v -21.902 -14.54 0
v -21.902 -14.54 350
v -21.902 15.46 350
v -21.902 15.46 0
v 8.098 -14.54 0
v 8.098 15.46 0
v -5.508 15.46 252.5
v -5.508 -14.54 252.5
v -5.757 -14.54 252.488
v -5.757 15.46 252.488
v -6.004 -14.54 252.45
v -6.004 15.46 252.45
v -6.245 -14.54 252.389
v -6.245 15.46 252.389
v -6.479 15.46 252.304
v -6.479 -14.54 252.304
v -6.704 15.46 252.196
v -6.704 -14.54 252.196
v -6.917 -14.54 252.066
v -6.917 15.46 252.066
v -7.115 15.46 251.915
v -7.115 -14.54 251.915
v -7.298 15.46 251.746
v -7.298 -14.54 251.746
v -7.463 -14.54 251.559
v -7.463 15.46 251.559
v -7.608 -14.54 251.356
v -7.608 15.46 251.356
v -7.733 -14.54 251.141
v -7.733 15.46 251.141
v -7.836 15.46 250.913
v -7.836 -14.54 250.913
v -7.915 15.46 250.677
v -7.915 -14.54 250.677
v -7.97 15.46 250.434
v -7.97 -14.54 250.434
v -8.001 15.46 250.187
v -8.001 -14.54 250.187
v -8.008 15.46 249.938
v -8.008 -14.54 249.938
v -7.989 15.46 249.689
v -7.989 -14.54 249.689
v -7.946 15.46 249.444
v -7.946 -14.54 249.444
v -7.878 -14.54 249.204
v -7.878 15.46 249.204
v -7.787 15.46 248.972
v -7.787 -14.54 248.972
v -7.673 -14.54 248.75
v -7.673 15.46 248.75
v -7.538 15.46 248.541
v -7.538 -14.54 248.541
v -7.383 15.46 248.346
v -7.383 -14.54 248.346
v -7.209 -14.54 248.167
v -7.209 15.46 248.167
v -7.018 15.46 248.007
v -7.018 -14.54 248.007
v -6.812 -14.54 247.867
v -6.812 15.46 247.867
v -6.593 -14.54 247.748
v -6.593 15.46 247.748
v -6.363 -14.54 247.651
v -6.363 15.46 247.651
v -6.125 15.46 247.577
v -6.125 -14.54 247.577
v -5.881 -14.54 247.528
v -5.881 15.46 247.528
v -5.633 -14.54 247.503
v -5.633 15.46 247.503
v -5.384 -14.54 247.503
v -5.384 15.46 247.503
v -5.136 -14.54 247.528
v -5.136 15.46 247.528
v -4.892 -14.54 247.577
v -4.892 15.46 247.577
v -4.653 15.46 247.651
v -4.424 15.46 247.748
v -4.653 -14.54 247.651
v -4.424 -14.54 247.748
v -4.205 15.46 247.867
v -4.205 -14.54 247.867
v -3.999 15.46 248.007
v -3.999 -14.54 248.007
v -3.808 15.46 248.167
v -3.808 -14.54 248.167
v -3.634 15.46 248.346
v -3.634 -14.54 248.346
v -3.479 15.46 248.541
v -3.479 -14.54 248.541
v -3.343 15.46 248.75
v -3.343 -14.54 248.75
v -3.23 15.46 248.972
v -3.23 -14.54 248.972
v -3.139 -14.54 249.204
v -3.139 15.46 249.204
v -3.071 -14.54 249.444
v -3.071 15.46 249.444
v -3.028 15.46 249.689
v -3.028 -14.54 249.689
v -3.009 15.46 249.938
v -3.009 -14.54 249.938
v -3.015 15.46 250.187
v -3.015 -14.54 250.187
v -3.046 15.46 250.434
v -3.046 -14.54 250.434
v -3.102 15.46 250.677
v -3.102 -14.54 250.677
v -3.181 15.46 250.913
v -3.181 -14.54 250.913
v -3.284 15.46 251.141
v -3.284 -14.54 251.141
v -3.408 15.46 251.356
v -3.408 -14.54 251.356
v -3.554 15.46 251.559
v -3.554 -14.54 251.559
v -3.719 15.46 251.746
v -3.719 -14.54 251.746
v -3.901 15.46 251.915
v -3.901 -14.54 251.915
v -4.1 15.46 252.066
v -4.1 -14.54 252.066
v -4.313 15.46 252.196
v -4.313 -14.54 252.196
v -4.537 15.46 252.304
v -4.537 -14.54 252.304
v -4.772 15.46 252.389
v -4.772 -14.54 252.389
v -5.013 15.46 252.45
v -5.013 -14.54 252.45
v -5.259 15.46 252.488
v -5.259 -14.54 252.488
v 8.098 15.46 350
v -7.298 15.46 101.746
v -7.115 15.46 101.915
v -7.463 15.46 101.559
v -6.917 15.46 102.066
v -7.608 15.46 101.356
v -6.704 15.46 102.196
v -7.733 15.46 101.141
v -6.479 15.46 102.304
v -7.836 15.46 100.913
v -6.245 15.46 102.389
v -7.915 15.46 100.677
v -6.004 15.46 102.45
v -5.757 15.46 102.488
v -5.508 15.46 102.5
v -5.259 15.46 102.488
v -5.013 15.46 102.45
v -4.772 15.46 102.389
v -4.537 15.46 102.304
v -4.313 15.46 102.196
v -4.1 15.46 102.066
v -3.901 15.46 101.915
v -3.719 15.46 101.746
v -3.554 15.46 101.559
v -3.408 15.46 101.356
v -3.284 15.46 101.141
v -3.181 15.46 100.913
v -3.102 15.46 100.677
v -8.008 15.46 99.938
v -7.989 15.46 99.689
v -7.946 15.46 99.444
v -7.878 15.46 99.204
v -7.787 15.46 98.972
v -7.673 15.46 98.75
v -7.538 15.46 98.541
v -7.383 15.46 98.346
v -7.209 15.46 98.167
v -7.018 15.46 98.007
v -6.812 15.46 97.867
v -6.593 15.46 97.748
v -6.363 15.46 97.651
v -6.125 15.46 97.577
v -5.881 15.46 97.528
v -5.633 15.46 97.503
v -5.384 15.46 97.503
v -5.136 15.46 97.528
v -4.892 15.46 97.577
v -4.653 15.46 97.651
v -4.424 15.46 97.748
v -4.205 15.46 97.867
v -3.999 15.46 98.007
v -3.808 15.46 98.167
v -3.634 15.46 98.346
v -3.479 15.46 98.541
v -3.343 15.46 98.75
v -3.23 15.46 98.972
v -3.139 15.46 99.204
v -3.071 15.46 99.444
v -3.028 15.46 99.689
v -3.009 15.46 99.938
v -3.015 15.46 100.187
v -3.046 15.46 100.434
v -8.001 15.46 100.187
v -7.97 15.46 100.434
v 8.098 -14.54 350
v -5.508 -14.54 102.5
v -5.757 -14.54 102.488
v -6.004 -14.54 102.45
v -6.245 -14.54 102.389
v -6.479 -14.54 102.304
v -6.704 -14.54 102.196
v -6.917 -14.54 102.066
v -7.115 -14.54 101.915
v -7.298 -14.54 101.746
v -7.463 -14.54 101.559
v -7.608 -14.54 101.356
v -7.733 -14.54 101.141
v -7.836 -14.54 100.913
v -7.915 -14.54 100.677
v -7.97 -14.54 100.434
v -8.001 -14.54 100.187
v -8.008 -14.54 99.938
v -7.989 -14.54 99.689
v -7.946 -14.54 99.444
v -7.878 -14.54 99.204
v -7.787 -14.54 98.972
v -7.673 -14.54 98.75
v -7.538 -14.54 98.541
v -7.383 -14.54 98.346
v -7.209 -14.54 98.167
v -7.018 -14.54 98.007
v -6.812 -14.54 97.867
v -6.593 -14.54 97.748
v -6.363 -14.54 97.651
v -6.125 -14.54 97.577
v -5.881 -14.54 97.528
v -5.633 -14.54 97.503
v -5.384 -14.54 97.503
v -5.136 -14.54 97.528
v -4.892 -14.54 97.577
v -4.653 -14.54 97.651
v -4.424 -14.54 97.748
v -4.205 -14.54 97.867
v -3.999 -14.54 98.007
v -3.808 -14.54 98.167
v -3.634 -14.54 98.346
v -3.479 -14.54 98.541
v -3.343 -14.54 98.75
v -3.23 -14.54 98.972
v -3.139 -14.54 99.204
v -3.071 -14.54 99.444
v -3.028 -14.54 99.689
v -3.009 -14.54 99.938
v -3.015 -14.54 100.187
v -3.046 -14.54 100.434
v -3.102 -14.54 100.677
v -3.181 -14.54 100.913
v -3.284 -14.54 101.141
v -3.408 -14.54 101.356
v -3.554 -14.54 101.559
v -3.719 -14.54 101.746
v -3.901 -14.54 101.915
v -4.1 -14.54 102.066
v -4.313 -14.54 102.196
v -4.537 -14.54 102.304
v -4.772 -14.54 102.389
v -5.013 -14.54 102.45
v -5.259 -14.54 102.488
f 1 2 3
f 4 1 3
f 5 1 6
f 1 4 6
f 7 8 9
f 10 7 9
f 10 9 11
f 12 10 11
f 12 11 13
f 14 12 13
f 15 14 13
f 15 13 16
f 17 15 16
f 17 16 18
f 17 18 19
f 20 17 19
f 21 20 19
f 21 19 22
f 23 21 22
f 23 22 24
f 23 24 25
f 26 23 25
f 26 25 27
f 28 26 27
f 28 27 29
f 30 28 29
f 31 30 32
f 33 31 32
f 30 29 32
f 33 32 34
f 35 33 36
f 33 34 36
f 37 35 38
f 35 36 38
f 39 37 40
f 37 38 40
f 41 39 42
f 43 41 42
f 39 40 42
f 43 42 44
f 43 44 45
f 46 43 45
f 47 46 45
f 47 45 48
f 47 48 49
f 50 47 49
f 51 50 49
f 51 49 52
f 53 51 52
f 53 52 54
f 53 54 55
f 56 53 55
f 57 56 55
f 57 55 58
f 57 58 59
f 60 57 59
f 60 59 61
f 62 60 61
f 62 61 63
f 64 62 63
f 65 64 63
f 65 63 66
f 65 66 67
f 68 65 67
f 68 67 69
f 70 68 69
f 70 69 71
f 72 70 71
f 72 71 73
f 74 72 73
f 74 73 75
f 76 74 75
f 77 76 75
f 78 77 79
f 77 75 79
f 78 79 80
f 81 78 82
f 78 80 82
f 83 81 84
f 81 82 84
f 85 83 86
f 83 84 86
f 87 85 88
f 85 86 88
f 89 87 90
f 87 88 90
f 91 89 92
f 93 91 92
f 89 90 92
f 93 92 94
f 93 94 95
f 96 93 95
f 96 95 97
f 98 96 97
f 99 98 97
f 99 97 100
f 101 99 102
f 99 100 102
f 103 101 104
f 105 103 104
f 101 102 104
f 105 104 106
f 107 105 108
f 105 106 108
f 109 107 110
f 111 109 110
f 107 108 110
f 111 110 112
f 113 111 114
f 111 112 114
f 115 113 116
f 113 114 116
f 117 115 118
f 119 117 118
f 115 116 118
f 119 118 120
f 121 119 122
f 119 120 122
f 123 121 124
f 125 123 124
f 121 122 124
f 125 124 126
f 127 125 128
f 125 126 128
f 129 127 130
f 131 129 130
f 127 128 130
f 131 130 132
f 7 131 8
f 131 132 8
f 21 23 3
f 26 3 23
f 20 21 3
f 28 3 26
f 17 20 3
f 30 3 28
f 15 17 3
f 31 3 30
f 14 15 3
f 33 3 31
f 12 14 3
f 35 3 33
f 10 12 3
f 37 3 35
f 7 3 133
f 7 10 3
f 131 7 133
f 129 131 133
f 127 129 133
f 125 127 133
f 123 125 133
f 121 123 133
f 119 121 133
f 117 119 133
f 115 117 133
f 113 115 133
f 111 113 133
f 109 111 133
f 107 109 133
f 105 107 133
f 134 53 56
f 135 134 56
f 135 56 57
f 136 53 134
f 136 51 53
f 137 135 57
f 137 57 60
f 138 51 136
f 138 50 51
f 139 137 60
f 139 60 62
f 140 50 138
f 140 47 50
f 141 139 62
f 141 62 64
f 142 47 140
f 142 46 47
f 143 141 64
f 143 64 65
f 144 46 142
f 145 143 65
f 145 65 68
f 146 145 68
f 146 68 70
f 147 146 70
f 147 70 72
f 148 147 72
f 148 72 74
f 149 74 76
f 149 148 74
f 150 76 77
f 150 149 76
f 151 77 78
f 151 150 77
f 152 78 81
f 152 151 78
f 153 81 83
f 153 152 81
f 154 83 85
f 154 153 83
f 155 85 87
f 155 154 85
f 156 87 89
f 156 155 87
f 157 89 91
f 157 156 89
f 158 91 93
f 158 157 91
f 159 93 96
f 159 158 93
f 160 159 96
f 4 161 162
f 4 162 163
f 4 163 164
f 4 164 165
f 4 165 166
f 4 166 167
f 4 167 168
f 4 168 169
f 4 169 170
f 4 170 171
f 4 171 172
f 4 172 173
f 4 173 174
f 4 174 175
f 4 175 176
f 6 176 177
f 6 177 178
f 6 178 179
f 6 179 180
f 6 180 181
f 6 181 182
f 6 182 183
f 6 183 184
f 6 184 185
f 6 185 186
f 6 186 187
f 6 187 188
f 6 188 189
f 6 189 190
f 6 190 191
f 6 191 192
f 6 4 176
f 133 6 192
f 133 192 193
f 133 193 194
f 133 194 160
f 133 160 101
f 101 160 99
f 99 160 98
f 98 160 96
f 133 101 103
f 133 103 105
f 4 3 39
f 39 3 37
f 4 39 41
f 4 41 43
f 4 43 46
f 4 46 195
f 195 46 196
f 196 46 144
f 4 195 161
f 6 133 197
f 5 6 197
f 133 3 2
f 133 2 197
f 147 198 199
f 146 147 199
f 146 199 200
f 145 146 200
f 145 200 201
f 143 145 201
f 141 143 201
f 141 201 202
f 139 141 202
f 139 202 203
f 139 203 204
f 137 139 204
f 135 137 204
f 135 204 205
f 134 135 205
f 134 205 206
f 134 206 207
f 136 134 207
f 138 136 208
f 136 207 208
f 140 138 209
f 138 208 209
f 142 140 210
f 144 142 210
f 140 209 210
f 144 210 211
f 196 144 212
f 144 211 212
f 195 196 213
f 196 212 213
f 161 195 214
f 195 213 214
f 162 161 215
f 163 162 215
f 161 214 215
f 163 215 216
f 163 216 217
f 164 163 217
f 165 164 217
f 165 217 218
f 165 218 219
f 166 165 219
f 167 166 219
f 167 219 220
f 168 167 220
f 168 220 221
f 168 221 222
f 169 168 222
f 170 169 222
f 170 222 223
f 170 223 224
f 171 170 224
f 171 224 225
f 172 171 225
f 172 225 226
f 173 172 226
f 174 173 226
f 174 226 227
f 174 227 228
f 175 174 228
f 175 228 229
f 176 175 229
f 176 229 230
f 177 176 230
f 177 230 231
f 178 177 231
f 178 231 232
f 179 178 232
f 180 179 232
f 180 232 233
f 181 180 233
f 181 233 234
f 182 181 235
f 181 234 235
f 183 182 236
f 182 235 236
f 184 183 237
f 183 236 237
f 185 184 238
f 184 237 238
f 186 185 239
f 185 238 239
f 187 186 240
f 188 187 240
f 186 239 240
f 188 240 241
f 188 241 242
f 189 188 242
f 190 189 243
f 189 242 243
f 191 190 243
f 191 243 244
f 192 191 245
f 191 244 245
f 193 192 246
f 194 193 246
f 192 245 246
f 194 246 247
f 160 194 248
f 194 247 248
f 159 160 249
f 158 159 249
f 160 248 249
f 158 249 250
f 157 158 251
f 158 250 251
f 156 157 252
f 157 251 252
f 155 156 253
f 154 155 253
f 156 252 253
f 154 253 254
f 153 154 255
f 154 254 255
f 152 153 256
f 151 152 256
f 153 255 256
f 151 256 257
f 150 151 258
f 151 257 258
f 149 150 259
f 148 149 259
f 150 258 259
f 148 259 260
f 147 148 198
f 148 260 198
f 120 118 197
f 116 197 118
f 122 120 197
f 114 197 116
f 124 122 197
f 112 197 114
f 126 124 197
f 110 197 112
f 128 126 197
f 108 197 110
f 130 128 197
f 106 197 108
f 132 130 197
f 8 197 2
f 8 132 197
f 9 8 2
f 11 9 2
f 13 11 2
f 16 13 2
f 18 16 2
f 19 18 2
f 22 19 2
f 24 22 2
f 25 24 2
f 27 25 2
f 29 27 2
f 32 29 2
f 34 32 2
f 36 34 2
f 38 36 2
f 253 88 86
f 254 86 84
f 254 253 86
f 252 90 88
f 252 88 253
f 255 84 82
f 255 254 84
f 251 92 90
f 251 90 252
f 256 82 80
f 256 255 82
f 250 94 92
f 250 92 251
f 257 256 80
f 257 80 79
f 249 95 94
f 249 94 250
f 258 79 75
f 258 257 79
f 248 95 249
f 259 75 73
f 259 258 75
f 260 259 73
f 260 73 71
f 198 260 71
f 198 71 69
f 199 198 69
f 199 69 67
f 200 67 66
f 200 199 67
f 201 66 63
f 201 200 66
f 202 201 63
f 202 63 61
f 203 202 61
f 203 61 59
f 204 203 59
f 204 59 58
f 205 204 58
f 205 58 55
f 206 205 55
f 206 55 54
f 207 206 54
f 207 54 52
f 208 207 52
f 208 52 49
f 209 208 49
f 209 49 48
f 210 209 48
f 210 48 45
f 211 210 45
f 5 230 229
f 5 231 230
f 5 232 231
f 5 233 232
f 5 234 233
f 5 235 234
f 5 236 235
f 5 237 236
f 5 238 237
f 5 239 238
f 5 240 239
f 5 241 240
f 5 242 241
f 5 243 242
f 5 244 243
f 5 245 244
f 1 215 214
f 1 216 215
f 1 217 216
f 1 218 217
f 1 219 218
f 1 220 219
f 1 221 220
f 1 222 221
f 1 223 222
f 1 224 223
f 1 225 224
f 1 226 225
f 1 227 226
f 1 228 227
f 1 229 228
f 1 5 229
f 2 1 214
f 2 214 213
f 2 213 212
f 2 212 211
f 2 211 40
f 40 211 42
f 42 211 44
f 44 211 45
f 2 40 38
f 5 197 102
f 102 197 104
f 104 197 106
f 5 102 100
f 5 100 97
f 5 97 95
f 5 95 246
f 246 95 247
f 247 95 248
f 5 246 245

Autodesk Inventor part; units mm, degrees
ref_plane "YZ Plane" through (0, 0, 0) normal (1, 0, 0) x (0, 1, 0)
ref_plane "XZ Plane" through (0, 0, 0) normal (0, 1, 0) x (-1, 0, 0)
ref_plane "XY Plane" through (0, 0, 0) normal (0, 0, 1) x (1, 0, 0)
sketch "Skizze1" plane through (0, 0, 0) normal (0, 0, 1) x (1, 0, 0)
  line L0 (-27.9018, 0) -> (14.0982, 0) projected
  line L1 (0, -20.5399) -> (0, 21.4601) projected
  line L2 (-21.9018, 15.4601) -> (8.0982, 15.4601)
  line L3 (8.0982, 15.4601) -> (8.0982, -14.5399)
  line L4 (8.0982, -14.5399) -> (-21.9018, -14.5399)
  line L5 (-21.9018, -14.5399) -> (-21.9018, 15.4601)
  point P0 (0, 0)
  dimension "d0" = 30
  dimension "d1" = 30
extrude "Extrusion1" add sketch "Skizze1" along normal blind 350
sketch "Skizze2" plane through (-21.9018, 15.4601, 0) normal (0, 1, 0) x (1, 0, 0)
  line L0 (30, 0) -> (0, 0) projected
  line L1 (30, -350) -> (0, -350) projected
  point P0 (21.9018, 0)
  point P1 (16.3934, -100)
  point P2 (16.3934, -250)
  dimension "d4" = 100
  dimension "d5" = 100
hole "Bohrung1" at (-5.5084, 15.4601, 100) at (-5.5084, 15.4601, 250) direction (0, -1, 0) diameter 5 end through all
properties part number "Träger vorne"
